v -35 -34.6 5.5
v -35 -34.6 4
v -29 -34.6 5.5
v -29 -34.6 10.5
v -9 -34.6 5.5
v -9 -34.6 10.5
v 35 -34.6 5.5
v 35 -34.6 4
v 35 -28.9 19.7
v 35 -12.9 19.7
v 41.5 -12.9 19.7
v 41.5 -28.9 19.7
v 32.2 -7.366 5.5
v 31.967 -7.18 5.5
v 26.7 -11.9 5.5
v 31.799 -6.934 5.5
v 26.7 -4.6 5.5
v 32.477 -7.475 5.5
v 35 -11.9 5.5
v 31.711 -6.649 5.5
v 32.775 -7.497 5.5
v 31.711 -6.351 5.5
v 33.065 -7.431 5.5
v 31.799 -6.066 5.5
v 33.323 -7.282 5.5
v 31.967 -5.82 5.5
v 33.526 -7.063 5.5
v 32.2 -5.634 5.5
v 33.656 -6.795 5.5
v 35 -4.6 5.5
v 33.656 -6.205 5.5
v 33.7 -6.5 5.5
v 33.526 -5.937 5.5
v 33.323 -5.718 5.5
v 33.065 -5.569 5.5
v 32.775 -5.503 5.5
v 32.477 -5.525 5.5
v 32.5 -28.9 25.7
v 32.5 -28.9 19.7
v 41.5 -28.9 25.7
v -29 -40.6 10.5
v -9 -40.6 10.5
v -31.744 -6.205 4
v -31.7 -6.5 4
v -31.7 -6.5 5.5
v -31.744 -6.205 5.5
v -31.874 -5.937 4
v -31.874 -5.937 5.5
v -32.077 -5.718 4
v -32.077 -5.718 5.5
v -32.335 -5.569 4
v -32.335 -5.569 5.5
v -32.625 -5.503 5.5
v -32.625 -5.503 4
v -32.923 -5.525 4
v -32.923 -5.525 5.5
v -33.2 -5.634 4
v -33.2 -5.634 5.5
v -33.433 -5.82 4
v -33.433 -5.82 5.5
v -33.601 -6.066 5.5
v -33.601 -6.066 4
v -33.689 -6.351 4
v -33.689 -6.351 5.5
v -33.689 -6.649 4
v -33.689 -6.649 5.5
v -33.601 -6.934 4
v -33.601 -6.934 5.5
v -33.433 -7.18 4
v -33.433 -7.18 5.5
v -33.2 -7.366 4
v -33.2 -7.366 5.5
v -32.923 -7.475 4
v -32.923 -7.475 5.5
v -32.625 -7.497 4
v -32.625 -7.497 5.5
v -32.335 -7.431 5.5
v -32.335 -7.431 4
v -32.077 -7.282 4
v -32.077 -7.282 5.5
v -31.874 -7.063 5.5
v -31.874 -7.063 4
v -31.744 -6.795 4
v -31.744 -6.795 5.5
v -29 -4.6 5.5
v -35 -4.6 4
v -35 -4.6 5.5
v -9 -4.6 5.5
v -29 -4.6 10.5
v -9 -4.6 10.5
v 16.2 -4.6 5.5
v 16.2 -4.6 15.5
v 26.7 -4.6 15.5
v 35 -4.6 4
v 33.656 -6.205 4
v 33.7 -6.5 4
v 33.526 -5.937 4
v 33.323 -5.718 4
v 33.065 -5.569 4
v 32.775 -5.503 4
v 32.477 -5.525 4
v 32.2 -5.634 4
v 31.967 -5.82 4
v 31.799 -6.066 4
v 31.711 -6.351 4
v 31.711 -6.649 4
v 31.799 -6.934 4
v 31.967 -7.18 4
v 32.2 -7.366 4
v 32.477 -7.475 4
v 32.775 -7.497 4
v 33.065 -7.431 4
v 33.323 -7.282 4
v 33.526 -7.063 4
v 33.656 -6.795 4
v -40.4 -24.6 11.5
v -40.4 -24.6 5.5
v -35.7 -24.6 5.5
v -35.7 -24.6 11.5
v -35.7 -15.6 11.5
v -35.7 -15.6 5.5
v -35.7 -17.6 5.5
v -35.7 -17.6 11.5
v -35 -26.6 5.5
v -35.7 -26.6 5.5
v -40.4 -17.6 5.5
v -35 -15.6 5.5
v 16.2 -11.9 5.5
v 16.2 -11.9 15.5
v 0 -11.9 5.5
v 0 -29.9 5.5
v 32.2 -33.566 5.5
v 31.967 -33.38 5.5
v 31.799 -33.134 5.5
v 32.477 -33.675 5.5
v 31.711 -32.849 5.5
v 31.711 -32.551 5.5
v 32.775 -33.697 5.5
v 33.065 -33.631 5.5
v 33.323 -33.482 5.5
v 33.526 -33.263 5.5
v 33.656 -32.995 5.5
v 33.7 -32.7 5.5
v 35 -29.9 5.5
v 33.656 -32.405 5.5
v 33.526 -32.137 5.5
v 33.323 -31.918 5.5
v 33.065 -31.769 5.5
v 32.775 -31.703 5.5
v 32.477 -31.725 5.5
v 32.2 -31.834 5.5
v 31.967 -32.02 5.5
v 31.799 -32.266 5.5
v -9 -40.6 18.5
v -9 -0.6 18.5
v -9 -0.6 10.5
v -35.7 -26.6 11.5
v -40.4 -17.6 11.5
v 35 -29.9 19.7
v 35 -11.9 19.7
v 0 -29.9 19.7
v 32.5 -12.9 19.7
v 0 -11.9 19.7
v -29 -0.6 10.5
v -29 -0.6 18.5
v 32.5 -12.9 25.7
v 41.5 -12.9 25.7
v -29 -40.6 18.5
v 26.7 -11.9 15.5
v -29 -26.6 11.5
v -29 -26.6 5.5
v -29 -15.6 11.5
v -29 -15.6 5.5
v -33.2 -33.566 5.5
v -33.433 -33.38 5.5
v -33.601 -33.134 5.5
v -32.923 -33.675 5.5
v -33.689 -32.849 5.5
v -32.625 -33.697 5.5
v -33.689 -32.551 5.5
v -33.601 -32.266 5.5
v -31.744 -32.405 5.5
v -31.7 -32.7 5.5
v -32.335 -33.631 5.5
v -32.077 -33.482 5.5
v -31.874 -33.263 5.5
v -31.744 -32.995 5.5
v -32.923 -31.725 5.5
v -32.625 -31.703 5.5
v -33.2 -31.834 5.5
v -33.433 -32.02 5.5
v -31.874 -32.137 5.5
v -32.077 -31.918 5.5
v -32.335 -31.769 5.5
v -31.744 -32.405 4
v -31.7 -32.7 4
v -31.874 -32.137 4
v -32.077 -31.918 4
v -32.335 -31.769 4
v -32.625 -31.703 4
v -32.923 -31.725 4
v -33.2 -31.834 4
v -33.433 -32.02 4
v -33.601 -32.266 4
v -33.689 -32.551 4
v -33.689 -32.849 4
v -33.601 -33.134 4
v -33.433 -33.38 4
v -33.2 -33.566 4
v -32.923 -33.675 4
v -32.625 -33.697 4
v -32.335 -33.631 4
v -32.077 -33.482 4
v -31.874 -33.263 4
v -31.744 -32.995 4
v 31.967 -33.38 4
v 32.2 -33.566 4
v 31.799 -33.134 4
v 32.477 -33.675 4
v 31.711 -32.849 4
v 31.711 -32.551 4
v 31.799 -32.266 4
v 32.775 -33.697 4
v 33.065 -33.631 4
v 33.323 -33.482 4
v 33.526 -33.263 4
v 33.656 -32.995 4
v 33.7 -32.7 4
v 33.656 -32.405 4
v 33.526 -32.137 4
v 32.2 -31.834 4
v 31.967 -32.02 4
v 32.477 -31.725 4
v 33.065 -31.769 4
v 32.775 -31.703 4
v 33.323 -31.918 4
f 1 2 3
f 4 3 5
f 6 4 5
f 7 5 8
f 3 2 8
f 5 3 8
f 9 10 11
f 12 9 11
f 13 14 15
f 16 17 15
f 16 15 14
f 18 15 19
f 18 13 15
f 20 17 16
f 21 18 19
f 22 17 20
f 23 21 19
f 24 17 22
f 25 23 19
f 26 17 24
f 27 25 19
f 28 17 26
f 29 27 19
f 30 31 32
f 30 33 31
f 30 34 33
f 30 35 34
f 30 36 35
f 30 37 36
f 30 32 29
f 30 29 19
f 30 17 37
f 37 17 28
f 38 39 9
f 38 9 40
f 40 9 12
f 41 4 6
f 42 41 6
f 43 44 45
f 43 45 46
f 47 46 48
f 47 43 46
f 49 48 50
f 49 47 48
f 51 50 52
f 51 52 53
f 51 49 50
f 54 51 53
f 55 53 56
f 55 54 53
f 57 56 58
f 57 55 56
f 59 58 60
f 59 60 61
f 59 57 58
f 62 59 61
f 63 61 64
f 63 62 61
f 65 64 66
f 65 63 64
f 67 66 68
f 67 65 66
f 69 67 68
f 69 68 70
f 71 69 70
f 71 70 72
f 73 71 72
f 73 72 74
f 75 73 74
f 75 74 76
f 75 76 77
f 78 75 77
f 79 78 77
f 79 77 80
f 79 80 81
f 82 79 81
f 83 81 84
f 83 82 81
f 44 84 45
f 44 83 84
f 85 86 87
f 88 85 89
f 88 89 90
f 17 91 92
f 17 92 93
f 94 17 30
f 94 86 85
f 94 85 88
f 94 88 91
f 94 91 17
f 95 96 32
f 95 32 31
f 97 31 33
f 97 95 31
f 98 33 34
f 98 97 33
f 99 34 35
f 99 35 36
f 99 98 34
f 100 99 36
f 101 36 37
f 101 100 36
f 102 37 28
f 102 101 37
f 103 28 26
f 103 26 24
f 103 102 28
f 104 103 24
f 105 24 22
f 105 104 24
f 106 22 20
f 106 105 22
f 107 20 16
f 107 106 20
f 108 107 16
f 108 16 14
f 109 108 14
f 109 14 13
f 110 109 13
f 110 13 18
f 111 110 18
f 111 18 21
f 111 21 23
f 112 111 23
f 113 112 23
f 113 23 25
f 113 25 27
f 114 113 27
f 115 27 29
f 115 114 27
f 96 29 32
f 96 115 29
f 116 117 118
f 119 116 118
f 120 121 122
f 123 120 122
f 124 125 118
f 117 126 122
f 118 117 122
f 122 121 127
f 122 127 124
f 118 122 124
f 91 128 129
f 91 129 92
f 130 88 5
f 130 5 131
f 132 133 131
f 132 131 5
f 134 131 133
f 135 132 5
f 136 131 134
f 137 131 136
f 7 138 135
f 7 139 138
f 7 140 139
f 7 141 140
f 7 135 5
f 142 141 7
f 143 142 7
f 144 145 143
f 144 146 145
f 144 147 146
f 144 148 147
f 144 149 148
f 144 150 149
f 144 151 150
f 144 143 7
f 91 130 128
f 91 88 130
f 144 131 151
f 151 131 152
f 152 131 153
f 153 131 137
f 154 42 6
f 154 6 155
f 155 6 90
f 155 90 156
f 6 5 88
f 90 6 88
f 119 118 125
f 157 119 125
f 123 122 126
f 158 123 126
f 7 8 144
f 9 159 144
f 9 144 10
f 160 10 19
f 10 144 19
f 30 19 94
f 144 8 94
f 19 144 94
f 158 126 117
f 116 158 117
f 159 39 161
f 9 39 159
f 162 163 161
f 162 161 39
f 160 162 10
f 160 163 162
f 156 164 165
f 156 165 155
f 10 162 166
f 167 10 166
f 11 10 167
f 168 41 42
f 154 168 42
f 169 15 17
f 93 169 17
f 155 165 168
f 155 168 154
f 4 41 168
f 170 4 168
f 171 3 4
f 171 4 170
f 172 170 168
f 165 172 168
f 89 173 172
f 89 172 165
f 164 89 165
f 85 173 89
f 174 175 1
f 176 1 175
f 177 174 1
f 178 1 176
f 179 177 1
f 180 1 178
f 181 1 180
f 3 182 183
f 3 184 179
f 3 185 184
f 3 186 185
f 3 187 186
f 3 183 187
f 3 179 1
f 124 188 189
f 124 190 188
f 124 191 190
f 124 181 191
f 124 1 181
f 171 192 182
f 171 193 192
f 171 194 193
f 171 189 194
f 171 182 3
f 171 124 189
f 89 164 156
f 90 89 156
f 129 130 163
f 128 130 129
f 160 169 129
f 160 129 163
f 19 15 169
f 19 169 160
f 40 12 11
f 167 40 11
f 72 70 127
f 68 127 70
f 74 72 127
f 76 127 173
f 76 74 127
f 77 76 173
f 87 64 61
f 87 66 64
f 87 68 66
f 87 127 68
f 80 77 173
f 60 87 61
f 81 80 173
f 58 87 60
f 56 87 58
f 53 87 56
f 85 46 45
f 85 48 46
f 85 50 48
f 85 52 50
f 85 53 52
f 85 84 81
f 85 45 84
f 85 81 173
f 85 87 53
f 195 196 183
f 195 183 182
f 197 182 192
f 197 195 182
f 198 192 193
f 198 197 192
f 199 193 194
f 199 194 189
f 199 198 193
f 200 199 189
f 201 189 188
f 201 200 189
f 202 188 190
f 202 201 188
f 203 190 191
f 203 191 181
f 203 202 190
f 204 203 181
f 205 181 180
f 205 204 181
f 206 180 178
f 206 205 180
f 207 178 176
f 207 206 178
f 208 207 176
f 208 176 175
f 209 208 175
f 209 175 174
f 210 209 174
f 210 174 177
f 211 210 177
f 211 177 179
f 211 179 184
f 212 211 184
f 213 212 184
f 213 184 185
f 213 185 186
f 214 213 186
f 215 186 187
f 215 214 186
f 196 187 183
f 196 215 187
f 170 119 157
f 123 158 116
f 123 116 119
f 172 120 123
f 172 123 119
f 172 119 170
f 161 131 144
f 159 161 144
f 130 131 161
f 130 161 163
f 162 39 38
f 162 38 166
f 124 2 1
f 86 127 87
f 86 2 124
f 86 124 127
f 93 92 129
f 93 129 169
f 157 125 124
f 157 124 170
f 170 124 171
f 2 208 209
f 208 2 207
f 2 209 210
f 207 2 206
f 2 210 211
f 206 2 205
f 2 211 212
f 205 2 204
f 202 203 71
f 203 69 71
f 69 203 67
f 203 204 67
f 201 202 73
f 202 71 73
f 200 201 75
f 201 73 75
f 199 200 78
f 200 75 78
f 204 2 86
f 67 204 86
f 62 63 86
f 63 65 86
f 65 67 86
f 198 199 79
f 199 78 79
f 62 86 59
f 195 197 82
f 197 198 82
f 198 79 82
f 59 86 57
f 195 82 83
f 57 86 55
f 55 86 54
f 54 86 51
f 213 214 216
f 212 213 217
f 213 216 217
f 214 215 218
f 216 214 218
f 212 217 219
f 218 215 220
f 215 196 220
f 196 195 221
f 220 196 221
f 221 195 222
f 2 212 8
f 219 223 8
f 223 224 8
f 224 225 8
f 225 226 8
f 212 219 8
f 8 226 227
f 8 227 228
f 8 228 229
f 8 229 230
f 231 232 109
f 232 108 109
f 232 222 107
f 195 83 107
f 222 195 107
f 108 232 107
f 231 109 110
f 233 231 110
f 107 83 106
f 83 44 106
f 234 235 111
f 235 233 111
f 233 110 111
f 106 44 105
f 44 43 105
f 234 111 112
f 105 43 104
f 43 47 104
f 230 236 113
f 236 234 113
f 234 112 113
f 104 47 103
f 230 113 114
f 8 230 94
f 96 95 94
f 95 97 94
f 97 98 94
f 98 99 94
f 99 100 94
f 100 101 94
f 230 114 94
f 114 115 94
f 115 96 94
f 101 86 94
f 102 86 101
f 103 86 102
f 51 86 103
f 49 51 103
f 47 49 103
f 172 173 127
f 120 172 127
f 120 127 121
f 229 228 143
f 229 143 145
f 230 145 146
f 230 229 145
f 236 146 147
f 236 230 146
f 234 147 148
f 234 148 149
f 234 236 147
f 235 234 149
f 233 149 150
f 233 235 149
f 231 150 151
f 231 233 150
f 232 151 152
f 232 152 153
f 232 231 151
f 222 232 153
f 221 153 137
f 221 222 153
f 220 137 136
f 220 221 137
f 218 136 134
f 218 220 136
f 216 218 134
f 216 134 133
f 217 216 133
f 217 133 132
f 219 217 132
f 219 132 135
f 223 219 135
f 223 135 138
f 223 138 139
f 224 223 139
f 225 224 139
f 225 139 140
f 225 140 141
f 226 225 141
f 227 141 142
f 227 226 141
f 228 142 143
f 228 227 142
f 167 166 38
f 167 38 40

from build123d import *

# Parameters (mm, degrees)
SKETCH002_W  = 70
SKETCH002_H  = 30
SKETCH002_R  = 1
PAD002_DEPTH = 1.5
SKETCH003_W  = 20
SKETCH003_H  = 30
PAD003_DEPTH = 5
SKETCH004_W  = 20
SKETCH004_H  = 40
PAD004_DEPTH = 8
SKETCH005_W  = 35
SKETCH005_H  = 18
PAD005_DEPTH = 14.2
SKETCH006_W  = 9
SKETCH006_H  = 16
PAD006_DEPTH = 6
SKETCH010_W  = 10.5
SKETCH010_H  = 7.3
PAD009_DEPTH = 10
PAD010_DEPTH = 6


with BuildPart() as part:
    # Sketch002 → Pad002 (new body)
    with BuildSketch(Plane.XY):
        Rectangle(SKETCH002_W, SKETCH002_H)
        with Locations((-32.7, 13.1)):
            Circle(SKETCH002_R, mode=Mode.SUBTRACT)
        with Locations((-32.7, -13.1)):
            Circle(SKETCH002_R, mode=Mode.SUBTRACT)
        with Locations((32.7, 13.1)):
            Circle(SKETCH002_R, mode=Mode.SUBTRACT)
        with Locations((32.7, -13.1)):
            Circle(SKETCH002_R, mode=Mode.SUBTRACT)
    extrude(amount=PAD002_DEPTH)

    # Sketch003 (on Face10 of Pad002) → Pad003 (join)
    with BuildSketch(Plane.XY.offset(1.5)):
        with Locations((-19, 0)):
            Rectangle(SKETCH003_W, SKETCH003_H)
    extrude(amount=PAD003_DEPTH)

    # Sketch004 (on Face15 of Pad003) → Pad004 (join)
    with BuildSketch(Plane.XY.offset(6.5)):
        with Locations((-19, -1)):
            Rectangle(SKETCH004_W, SKETCH004_H)
    extrude(amount=PAD004_DEPTH)

    # Sketch005 (on Face13 of Pad004) → Pad005 (join)
    with BuildSketch(Plane.XY.offset(1.5)):
        with Locations((17.5, -1.3)):
            Rectangle(SKETCH005_W, SKETCH005_H)
    extrude(amount=PAD005_DEPTH)

    # Sketch006 (on Face27 of Pad005) → Pad006 (join)
    with BuildSketch(Plane.XY.offset(15.7)):
        with Locations((37, -1.3)):
            Rectangle(SKETCH006_W, SKETCH006_H)
    extrude(amount=PAD006_DEPTH)

    # Sketch010 (on Face13 of Pad006) → Pad009 (join)
    with BuildSketch(Plane.XY.offset(1.5)):
        with Locations((21.45, 11.35)):
            Rectangle(SKETCH010_W, SKETCH010_H)
    extrude(amount=PAD009_DEPTH)

    # Sketch012 (on Face12 of Pad009) → Pad010 (join)
    with BuildSketch(Plane.XY.offset(1.5)):
        Polygon((-29, 4), (-35.7, 4), (-35.7, 2), (-40.4, 2), (-40.4, -5), (-35.7, -5), (-35.7, -7), (-29, -7), align=None)
    extrude(amount=PAD010_DEPTH)


with BuildPart() as part_1:
    # Body001 placement: moved
    add(part.part.moved(Location((0, -19.6, 4))))


solid = part_1.part
